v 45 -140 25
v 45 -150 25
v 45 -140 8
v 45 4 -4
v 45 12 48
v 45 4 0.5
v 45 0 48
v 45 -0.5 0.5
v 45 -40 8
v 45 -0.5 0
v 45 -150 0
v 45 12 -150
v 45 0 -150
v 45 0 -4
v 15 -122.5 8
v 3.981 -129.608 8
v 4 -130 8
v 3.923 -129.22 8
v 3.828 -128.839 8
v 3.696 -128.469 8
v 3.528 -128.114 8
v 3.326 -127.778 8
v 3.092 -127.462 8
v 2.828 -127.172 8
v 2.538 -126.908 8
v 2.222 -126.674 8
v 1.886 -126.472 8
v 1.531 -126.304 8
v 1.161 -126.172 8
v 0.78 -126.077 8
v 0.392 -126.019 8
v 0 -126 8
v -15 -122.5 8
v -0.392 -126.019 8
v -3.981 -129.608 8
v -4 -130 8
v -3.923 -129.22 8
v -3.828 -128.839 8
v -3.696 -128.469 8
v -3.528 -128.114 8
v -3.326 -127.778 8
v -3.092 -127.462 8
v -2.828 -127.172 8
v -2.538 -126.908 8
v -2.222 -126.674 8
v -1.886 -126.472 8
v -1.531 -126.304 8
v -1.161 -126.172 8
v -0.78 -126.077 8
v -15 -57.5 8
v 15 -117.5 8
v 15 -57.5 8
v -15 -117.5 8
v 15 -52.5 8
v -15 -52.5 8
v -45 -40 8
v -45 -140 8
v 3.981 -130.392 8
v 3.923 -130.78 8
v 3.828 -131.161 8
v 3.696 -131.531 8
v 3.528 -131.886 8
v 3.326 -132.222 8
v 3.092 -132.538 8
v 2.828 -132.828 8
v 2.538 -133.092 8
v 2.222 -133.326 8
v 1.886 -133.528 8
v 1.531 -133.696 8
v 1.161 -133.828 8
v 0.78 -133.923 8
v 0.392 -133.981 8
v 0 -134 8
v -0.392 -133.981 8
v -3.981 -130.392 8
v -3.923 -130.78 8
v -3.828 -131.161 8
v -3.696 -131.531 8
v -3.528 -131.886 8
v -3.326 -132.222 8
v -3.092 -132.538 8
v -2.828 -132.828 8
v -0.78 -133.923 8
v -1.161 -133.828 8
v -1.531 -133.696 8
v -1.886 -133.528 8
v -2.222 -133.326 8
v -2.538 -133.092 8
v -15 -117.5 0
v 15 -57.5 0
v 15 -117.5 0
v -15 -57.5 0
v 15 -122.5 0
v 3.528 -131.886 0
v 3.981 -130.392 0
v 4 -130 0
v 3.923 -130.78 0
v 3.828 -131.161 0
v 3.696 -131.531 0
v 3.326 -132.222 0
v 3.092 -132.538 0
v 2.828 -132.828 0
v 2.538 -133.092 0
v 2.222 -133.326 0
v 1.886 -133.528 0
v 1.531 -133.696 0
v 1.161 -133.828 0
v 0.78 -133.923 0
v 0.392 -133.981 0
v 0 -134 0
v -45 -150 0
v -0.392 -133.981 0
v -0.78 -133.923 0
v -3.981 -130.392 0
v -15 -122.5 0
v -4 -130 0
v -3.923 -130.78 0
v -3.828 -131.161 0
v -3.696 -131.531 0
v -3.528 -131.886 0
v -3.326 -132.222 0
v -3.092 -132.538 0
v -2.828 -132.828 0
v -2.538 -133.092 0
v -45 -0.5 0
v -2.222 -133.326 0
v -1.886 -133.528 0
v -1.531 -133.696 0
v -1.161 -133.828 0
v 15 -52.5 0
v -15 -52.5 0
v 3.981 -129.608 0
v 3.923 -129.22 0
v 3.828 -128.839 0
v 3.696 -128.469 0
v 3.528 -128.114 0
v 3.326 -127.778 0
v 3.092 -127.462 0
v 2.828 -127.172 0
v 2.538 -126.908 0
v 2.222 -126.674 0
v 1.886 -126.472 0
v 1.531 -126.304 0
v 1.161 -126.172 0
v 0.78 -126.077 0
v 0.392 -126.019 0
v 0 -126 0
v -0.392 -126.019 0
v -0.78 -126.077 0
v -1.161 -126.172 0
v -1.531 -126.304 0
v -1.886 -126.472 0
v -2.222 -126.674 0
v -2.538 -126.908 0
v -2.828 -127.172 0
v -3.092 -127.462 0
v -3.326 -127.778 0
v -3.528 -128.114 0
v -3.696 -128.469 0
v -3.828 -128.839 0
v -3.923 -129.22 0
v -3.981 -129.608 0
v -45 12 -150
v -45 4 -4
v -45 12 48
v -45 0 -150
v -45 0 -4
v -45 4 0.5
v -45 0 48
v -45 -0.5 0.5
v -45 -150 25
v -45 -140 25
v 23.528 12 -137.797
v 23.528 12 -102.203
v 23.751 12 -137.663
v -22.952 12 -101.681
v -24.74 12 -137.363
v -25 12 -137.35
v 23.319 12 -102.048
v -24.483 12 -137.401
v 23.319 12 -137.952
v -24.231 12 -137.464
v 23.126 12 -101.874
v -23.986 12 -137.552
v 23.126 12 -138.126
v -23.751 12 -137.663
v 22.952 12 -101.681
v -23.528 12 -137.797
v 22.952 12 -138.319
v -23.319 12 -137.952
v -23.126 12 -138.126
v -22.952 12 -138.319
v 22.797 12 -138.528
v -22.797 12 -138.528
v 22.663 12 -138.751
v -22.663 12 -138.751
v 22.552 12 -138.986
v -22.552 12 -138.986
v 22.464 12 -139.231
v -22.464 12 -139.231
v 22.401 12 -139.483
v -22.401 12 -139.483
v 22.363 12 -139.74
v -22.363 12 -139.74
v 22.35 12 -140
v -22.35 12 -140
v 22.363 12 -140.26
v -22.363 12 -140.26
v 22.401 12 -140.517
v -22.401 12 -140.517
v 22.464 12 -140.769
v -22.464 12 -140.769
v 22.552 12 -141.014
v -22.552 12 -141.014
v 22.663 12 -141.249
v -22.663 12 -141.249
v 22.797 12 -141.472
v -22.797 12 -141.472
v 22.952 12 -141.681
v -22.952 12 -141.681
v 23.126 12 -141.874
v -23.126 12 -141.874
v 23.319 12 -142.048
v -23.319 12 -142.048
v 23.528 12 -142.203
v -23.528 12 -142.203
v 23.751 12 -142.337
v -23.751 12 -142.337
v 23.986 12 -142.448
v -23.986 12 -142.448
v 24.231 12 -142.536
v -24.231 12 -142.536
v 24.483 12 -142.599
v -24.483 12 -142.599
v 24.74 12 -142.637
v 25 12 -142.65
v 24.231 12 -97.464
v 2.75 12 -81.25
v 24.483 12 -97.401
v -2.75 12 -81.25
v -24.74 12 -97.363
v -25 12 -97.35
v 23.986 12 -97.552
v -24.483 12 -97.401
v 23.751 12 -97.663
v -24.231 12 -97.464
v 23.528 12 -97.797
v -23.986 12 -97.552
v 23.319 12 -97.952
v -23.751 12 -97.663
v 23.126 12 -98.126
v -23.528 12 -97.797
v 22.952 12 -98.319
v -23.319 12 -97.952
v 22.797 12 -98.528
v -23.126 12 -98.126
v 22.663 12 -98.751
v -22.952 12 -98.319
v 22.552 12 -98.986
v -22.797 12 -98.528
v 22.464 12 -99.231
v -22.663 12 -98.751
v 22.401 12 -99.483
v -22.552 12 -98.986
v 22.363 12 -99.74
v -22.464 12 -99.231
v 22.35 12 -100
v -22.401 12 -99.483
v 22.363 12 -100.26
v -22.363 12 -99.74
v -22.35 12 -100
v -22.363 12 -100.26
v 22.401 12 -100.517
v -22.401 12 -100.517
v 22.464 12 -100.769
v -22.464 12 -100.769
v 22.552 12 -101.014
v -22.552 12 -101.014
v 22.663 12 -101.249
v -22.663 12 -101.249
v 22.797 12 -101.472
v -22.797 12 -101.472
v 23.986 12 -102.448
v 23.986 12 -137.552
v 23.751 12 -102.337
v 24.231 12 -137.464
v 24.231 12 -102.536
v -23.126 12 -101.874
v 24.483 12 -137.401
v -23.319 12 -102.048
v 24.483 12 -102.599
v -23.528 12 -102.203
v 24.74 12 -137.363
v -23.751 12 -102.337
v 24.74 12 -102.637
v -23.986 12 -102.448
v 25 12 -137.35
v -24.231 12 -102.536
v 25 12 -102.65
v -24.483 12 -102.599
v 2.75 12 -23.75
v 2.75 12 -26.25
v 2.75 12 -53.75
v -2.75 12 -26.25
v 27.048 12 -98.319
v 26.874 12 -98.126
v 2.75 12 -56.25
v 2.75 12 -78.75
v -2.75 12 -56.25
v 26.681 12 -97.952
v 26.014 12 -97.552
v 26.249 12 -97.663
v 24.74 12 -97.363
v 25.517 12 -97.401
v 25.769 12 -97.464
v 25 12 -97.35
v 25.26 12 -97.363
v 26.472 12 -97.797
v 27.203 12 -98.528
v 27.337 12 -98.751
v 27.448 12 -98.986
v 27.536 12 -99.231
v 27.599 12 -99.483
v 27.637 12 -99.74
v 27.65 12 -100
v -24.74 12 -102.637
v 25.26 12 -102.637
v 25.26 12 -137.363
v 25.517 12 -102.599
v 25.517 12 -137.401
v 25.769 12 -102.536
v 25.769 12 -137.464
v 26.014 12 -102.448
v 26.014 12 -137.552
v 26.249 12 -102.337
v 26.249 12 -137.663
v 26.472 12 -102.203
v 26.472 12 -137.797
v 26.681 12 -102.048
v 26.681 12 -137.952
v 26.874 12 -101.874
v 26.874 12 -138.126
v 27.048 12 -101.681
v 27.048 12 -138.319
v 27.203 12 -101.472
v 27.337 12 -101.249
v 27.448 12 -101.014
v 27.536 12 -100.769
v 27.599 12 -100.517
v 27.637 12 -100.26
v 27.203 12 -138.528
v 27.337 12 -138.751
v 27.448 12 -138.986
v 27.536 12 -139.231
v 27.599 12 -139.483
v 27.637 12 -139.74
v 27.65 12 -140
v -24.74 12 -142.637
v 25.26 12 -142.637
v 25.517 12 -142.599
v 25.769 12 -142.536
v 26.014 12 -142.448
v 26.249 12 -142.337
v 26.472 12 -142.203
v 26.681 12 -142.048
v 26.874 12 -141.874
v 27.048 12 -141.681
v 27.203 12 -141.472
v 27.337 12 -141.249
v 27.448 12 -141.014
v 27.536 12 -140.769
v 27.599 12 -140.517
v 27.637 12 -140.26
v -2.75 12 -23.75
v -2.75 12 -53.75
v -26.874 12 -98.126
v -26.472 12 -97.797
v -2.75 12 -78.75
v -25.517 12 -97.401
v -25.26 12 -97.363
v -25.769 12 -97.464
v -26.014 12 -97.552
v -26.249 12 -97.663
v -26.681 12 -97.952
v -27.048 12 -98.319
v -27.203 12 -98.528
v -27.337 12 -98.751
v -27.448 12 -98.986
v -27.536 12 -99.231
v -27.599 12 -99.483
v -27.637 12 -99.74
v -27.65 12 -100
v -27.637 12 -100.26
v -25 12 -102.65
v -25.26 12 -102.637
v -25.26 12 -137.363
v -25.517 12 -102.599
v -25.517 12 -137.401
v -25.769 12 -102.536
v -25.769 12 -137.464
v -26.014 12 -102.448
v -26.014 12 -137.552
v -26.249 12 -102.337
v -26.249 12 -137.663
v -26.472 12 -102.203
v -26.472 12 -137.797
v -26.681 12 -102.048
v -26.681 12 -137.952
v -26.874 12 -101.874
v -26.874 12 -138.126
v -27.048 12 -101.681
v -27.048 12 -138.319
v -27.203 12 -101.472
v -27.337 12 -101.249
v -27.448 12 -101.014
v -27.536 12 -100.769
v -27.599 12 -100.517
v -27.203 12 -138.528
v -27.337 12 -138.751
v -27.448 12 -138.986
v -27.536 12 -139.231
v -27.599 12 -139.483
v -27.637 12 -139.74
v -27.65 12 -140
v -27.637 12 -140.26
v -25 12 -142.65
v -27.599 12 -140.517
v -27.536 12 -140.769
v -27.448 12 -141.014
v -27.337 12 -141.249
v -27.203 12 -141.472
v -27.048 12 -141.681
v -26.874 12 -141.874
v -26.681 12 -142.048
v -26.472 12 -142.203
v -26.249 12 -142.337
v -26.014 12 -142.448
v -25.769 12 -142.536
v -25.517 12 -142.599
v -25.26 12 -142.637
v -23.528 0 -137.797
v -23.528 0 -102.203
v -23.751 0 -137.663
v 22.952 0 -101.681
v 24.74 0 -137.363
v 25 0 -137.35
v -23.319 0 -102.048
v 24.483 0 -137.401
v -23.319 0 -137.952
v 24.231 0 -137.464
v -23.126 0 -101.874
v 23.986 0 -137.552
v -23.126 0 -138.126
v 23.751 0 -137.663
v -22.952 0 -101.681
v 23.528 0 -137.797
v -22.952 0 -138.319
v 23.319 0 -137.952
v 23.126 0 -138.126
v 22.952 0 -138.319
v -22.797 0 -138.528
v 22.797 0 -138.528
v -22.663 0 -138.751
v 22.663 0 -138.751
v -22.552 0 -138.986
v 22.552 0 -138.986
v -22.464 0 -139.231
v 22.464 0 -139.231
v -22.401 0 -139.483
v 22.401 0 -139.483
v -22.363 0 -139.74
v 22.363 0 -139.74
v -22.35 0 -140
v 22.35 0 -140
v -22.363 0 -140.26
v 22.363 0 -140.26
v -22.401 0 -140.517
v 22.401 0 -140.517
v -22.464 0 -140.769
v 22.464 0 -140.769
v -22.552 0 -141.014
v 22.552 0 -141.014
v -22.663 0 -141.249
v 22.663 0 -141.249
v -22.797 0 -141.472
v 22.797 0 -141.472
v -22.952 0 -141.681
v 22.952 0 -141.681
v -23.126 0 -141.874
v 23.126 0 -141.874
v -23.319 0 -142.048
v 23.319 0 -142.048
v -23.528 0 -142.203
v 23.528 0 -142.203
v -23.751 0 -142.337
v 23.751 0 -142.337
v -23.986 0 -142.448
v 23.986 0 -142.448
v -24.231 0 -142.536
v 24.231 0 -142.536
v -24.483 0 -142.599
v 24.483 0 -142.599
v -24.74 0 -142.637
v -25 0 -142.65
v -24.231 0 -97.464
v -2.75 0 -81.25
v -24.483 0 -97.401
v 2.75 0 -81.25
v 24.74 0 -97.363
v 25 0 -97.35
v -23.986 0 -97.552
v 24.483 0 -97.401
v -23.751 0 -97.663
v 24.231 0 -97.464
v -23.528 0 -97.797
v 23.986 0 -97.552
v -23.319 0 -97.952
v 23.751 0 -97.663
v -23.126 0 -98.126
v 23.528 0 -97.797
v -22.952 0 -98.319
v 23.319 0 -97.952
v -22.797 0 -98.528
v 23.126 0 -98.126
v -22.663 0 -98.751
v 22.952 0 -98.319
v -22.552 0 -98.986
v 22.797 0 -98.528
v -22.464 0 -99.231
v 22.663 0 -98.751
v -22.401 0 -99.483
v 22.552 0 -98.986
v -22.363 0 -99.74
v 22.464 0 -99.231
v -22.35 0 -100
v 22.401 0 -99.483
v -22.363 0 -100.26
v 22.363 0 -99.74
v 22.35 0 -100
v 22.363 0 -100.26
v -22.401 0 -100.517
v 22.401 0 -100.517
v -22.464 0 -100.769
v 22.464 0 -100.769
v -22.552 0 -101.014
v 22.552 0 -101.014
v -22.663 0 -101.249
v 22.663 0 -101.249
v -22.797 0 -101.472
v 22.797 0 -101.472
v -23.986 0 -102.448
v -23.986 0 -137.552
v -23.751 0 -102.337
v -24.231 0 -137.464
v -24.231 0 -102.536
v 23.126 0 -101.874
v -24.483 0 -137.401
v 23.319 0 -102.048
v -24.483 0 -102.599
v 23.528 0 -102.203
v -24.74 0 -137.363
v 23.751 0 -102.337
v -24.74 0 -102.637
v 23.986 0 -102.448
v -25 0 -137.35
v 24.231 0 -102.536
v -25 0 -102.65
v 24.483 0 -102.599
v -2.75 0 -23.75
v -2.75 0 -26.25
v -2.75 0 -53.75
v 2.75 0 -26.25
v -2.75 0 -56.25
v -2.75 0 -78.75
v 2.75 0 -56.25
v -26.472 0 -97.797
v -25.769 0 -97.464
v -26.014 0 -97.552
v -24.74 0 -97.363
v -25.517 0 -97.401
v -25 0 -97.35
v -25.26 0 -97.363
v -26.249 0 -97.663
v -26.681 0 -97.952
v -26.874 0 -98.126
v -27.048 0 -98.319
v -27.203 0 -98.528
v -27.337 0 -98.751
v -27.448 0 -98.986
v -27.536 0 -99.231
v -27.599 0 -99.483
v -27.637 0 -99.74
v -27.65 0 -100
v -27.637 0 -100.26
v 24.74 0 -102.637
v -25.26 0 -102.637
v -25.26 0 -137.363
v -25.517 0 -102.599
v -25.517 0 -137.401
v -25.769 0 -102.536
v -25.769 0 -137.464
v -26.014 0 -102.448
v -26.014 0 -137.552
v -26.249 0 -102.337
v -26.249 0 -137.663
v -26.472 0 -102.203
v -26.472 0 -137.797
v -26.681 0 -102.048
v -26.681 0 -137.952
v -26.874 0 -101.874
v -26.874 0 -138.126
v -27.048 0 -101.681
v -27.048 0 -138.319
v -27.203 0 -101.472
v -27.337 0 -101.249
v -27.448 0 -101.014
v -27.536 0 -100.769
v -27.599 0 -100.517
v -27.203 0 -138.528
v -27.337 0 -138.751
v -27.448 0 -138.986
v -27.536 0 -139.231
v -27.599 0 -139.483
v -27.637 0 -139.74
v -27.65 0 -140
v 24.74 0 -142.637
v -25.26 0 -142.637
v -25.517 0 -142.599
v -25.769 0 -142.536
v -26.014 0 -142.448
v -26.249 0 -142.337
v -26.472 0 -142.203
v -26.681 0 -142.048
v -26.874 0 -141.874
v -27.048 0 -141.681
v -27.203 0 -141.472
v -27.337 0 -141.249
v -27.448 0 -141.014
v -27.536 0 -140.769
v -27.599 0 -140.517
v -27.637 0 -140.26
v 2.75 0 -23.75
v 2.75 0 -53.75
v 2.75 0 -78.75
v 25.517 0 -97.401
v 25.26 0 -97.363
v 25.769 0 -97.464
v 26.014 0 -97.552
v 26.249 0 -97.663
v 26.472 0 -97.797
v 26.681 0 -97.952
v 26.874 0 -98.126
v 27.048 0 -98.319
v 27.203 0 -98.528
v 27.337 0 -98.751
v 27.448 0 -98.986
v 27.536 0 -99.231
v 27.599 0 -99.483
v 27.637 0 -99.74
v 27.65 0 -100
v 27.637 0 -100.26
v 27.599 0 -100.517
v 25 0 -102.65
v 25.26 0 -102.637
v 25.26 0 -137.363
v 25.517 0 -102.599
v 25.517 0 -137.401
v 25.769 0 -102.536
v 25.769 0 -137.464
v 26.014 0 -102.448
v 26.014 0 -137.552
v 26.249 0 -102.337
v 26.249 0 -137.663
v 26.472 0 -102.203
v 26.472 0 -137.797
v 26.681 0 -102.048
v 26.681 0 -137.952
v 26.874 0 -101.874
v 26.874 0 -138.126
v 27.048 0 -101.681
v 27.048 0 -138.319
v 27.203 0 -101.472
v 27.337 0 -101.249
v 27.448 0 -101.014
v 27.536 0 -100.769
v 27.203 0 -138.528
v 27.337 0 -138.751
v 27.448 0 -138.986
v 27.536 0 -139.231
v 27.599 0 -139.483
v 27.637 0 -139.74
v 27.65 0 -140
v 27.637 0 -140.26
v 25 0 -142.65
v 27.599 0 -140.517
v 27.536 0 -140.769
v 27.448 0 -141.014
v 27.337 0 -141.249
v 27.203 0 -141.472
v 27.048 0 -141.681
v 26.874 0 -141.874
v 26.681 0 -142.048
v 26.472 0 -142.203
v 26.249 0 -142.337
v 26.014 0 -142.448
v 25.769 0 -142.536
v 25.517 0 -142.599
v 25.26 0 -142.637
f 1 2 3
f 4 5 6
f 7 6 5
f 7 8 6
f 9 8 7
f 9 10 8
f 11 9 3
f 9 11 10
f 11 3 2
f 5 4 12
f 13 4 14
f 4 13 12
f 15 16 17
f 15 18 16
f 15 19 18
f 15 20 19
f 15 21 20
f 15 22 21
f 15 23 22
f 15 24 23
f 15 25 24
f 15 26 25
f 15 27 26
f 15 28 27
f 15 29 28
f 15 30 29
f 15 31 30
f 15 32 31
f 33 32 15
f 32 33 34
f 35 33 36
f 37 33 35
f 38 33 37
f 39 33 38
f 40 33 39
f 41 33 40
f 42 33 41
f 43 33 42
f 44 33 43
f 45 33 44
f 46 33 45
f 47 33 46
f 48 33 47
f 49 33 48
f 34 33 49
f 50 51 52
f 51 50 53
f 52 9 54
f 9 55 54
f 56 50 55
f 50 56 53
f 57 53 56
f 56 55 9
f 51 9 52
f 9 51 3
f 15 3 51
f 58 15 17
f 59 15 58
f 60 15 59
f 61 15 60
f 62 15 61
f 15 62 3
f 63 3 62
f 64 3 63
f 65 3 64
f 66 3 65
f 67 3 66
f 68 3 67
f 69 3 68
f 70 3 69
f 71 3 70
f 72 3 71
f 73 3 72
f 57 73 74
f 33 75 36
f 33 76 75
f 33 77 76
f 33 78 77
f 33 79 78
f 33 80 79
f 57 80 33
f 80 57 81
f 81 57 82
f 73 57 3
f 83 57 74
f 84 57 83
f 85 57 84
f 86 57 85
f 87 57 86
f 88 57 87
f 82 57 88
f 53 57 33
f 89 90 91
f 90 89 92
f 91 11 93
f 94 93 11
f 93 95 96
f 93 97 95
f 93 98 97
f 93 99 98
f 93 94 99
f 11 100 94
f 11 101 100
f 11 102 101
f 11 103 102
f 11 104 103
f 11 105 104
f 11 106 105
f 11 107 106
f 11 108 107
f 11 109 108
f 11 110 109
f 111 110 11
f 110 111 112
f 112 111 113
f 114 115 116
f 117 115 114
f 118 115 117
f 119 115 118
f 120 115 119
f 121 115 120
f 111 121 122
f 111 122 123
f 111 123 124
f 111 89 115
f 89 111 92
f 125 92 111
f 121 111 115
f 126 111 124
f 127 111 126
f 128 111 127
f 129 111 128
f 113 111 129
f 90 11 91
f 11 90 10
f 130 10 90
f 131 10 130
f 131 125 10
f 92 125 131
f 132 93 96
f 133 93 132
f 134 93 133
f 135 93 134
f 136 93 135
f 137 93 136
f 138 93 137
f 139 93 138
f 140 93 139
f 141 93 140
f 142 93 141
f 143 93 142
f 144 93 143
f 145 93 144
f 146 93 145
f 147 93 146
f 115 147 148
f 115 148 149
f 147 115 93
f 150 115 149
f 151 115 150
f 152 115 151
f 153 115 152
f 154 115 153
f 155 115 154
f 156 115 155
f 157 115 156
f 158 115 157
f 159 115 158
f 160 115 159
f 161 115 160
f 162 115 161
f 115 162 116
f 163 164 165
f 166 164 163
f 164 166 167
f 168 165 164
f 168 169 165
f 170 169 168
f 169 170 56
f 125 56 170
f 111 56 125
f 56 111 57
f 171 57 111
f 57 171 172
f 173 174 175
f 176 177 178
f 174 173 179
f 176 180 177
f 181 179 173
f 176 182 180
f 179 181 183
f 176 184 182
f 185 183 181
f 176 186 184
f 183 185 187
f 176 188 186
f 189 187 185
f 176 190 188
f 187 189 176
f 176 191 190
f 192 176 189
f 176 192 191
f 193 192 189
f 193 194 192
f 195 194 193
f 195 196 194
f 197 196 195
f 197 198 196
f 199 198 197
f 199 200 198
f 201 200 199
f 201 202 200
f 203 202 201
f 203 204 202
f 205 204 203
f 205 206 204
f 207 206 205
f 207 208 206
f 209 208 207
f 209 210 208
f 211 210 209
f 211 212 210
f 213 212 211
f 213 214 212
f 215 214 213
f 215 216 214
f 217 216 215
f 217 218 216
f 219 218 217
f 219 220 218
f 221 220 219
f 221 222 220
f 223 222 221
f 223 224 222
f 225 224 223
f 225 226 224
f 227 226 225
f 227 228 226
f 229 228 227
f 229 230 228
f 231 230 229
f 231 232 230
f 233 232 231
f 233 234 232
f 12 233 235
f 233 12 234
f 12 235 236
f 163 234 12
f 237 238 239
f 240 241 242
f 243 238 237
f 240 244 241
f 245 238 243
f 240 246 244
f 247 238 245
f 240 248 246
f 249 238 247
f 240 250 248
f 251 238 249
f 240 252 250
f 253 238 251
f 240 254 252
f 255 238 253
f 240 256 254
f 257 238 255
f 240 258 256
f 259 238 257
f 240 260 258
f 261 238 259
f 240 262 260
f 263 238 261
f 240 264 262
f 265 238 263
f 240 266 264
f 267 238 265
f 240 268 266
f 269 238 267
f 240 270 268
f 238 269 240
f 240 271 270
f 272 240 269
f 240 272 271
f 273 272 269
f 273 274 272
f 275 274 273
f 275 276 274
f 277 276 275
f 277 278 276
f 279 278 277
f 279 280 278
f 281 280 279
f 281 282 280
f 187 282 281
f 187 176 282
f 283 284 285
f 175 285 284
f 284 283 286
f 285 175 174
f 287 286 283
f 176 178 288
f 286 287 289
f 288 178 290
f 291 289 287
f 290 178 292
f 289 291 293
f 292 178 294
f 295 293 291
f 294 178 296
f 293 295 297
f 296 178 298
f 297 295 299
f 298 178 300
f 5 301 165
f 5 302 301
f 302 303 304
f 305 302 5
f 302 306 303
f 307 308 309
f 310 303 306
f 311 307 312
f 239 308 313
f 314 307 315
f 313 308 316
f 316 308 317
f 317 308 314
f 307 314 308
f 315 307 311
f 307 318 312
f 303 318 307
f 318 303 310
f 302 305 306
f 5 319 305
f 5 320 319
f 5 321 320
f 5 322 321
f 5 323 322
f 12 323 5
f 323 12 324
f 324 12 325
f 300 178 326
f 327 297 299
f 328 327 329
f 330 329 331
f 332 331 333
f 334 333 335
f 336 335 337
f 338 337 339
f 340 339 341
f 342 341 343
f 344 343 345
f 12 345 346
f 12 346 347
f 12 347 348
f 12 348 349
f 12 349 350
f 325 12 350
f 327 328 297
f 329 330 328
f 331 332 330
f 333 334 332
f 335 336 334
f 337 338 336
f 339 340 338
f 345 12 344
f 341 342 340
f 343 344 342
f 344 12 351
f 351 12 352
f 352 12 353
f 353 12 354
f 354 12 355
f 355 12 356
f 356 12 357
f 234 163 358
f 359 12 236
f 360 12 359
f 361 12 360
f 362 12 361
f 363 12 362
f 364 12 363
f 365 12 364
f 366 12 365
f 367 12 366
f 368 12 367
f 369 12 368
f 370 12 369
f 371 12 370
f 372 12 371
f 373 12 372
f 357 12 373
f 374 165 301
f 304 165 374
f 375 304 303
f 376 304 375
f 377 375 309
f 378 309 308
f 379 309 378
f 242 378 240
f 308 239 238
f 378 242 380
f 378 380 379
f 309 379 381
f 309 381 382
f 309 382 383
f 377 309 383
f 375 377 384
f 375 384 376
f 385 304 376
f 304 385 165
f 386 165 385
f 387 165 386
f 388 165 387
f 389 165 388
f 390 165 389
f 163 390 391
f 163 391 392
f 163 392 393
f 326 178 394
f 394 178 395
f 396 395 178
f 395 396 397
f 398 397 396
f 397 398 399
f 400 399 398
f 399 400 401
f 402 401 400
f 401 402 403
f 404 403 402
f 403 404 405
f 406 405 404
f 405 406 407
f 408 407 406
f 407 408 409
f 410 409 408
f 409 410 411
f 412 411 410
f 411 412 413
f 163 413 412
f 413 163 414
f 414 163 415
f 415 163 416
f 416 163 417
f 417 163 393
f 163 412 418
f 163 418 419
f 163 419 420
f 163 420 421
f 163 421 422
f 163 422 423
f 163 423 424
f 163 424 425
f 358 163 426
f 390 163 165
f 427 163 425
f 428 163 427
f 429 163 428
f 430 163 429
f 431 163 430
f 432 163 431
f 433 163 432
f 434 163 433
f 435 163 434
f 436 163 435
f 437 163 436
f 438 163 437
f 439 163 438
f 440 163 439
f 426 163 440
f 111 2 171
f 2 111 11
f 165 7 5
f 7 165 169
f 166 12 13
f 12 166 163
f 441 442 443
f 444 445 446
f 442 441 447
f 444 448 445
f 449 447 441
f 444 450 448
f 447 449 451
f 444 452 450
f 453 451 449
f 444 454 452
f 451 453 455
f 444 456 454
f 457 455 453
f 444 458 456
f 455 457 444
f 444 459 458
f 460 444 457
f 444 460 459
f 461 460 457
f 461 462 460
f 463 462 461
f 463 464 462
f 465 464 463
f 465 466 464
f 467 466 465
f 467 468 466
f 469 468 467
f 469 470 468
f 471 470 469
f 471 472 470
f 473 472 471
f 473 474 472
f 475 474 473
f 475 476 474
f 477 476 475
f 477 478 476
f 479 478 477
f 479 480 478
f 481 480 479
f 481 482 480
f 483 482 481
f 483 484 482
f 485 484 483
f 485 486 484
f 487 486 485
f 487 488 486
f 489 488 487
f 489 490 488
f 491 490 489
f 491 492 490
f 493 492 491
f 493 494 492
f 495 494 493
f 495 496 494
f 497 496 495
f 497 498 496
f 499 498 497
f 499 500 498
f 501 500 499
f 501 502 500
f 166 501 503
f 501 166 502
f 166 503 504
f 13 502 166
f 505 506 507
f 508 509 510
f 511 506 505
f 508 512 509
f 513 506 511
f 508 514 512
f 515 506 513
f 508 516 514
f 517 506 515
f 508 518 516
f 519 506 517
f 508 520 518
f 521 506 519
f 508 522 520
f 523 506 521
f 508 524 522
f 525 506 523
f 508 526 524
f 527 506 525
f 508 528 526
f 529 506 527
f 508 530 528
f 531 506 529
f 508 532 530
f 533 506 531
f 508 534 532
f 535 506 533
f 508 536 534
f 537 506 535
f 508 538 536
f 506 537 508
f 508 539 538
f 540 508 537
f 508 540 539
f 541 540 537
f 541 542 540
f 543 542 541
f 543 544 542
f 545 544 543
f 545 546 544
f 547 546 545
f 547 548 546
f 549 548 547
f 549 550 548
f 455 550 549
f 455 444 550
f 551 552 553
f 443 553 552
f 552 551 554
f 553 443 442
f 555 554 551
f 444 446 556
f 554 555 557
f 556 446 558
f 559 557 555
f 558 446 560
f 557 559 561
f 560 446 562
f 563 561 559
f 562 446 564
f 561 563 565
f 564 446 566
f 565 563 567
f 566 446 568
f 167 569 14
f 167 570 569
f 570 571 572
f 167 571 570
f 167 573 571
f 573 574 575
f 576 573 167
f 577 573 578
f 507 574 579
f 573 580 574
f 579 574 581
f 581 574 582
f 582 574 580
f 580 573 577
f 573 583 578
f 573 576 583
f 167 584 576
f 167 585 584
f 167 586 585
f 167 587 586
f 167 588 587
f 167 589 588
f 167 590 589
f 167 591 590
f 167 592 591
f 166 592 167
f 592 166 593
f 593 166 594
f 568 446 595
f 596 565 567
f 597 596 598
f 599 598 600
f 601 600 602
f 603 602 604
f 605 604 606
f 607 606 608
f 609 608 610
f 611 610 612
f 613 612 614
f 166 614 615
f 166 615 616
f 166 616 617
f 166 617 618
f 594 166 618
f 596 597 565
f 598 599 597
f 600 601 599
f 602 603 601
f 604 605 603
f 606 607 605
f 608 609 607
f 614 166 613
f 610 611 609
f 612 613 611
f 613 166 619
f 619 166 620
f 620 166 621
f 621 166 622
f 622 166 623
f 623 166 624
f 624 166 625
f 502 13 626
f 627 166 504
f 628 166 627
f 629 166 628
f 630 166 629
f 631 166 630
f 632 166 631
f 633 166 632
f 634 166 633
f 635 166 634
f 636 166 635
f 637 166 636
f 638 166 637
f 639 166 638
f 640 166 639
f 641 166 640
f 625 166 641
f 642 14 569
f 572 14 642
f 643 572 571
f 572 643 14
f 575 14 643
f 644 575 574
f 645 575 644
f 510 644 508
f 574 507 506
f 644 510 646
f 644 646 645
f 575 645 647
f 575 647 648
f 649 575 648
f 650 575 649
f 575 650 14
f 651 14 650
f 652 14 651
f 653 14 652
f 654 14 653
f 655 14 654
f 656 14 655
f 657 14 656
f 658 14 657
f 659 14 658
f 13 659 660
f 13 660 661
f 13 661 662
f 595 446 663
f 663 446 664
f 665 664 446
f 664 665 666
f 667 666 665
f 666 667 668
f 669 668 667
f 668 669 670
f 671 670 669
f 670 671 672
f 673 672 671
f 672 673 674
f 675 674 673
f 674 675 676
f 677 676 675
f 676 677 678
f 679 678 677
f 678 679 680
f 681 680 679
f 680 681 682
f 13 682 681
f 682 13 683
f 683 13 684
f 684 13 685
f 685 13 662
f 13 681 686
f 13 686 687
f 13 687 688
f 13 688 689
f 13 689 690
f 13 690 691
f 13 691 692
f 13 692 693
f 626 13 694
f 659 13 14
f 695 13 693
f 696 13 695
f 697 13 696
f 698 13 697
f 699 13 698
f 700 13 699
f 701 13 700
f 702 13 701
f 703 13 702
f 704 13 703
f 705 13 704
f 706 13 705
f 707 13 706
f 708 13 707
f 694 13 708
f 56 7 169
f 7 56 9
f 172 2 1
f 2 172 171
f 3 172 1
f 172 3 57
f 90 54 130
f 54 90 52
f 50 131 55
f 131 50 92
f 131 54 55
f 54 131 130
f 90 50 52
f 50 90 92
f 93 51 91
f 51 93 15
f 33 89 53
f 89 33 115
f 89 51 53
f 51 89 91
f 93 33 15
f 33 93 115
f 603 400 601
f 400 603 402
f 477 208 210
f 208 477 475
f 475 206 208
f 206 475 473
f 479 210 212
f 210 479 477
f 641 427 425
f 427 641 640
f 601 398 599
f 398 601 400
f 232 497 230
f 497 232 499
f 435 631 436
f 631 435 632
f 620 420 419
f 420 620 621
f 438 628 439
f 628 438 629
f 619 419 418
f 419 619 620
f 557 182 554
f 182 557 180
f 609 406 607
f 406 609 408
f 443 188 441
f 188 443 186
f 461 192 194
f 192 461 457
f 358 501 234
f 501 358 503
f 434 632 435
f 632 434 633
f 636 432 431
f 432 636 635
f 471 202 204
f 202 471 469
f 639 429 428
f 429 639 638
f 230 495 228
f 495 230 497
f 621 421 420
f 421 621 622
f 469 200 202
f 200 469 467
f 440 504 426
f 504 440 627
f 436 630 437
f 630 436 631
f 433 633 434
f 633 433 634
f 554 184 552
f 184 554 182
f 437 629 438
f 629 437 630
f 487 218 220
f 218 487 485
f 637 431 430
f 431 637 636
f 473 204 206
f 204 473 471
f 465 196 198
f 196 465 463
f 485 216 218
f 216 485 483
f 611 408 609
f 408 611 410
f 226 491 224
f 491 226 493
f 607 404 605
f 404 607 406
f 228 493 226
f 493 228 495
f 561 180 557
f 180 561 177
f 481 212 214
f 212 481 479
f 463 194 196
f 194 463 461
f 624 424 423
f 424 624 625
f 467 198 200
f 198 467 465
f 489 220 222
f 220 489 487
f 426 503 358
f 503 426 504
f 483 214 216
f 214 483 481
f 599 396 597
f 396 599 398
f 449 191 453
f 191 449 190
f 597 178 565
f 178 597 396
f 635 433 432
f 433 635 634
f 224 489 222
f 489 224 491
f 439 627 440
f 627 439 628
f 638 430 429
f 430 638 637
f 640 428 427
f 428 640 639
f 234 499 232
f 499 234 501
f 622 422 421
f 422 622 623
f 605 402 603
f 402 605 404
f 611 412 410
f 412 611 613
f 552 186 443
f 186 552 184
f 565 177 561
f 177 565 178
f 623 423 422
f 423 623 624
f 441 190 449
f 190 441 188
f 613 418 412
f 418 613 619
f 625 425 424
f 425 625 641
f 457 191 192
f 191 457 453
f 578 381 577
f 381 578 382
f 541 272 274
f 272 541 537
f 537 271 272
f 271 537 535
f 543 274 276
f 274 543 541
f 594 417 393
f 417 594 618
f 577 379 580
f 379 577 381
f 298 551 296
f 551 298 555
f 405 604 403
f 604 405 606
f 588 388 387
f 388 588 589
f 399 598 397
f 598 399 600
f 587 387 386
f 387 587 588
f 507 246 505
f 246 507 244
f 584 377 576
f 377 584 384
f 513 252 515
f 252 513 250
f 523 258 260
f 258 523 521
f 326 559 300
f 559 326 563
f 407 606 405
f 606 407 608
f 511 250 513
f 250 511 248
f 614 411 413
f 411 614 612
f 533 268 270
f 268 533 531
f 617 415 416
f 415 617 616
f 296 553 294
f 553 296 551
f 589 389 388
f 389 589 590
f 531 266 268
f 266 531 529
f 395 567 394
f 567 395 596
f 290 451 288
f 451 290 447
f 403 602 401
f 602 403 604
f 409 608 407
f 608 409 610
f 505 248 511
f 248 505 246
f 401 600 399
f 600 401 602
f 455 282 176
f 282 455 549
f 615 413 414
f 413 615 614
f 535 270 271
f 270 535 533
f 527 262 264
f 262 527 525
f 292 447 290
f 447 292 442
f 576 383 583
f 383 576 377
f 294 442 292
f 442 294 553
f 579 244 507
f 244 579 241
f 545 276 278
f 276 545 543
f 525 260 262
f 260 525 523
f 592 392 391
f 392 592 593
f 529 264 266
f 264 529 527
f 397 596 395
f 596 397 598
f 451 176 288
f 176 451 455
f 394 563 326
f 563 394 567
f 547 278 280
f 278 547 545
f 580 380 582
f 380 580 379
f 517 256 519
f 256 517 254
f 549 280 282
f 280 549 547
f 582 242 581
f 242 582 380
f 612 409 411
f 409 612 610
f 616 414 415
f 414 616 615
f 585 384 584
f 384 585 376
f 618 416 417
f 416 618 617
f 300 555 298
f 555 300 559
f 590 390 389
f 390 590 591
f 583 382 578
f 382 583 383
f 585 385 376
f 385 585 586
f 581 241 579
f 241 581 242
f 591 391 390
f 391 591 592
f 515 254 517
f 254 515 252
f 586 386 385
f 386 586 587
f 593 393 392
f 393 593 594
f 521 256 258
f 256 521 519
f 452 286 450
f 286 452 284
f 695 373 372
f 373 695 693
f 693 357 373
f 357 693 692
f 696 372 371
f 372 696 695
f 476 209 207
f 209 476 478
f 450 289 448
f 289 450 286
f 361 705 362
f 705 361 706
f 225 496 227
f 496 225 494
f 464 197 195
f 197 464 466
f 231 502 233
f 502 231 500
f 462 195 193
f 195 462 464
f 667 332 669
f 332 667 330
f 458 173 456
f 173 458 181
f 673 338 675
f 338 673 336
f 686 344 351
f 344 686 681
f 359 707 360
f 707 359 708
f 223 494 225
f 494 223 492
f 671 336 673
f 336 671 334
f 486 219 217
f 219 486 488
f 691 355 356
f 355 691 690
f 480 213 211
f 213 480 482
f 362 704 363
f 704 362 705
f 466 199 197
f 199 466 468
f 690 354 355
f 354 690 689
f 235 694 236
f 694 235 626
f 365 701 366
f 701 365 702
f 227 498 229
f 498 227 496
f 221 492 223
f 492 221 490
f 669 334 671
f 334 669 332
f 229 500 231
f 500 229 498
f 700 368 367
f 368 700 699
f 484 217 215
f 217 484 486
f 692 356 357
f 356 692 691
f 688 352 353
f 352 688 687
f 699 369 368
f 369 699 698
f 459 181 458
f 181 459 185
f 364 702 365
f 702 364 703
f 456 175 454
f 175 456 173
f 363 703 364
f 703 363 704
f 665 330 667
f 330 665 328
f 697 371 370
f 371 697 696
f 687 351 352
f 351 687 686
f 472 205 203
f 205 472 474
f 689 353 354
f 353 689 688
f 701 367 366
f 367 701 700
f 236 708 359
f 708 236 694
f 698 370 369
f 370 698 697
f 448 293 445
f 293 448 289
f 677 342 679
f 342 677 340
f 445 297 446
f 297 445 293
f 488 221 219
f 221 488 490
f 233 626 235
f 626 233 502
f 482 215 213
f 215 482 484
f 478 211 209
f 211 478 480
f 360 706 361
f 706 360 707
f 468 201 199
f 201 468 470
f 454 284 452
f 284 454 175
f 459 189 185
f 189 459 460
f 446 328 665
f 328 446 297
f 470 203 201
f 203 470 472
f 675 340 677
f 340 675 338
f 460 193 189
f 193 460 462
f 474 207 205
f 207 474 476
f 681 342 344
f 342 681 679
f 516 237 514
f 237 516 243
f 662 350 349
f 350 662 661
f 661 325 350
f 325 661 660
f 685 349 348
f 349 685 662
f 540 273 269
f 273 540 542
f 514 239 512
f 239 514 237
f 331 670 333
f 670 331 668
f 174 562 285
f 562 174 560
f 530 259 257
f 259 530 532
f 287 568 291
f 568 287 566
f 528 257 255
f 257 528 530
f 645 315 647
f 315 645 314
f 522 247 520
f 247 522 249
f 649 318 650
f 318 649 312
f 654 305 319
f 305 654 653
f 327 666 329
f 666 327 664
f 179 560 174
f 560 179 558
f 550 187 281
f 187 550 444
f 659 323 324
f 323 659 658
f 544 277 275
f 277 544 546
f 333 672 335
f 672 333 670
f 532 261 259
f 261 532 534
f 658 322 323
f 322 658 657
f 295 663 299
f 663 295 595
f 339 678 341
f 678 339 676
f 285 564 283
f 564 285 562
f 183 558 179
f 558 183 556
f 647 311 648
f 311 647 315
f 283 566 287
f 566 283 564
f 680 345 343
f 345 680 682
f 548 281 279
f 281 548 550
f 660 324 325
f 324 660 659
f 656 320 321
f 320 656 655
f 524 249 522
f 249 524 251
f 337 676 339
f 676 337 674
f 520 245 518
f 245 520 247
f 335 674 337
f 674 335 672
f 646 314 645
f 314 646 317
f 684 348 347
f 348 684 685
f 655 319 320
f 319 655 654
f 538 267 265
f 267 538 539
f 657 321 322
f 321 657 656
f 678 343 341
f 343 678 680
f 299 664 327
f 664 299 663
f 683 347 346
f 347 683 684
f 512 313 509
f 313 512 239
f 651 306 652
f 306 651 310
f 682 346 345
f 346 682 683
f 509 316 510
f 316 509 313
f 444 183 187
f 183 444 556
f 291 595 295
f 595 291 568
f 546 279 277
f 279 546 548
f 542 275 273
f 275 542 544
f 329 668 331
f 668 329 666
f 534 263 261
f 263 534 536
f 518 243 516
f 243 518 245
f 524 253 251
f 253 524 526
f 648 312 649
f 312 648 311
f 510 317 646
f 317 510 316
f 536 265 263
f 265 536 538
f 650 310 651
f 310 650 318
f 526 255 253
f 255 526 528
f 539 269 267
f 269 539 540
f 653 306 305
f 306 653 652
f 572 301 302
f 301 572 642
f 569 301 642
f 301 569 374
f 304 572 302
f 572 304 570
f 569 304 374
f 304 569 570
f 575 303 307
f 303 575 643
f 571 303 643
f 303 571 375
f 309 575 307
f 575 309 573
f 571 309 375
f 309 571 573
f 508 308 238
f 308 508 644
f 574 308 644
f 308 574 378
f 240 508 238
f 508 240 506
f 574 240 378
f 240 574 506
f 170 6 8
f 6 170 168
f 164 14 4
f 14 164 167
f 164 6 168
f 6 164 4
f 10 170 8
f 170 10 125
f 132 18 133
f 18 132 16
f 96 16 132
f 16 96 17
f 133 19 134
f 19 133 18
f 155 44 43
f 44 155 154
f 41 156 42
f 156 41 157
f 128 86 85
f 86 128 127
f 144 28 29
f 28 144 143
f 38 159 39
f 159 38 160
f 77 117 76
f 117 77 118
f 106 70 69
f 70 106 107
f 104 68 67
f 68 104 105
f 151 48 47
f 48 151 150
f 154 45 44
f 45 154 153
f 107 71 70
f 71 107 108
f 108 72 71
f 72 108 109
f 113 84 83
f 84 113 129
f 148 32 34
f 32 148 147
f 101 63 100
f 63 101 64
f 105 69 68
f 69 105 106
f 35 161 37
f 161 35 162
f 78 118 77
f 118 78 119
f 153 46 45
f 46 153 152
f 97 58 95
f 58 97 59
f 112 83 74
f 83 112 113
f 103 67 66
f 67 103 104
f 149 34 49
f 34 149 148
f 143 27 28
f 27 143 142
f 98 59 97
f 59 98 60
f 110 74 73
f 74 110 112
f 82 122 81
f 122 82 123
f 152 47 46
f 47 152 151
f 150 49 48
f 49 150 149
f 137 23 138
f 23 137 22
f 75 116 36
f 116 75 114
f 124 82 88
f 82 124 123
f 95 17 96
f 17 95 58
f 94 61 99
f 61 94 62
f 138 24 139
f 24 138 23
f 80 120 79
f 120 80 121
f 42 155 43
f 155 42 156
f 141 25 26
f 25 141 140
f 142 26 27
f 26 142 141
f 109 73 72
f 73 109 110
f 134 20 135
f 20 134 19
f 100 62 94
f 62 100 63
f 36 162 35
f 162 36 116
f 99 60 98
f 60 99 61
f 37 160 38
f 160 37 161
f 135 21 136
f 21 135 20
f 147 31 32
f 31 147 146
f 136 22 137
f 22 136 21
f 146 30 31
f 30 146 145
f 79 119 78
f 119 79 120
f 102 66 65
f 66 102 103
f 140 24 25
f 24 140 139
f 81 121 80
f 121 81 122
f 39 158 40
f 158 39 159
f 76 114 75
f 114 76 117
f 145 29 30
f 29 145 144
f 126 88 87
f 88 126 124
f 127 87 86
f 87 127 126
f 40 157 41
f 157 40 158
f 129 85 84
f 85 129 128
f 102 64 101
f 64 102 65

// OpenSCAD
// =====================================================================
// xdcr_poolside_jig.scad — TD04A プールサイド L 字治具 (実験用)
// プールの縁にまたがせ、デッキ側の水平板におもりを載せて押さえる。
// 支柱がプール内壁に沿って下り、下端の水平棚に xdcr_clamp を M5×4 で
// 載せる。棚には 0°/90° の 2 組のボルトパターンがあり、音響ビームを
// 壁に対して垂直 (対面測距) にも平行 (同一壁面上での測距) にも向けられる。
//
//   part="hook" : デッキ板 + 縁の立ち上がり/ガセット + 支柱 (上半分)
//   part="foot" : 立ち下がり (下半分) + 振動子棚
//   2 つを重ね継ぎ (foot が hook の池側面に重なる) して M5×4 で締結する。
//   2 分割なのは、必要な水深 (デッキ面下 ~290mm) が印刷ベッドに載らないため。
//
// 座標系: X = 幅(0 が中心) / Y = プール方向(+Y が水側、Y=0 が壁面) /
//         Z = 0 がデッキ面、下が -Z。
// 印刷向き: hook / foot とも「幅 X を Z 方向に立てて」印刷する。
//   断面 (YZ の L 形) がそのままベッドに載り、全層が同じ断面になるので
//   サポートは一切要らず、曲げ荷重も層内で受けられる。
//   → スライサで X 軸まわりに 90° 回してから配置すること。
// 要実測: lip_y(縁のせり出し) / freeboard(デッキ面→水面) / TD04A 実寸
// =====================================================================

/* [部品選択] */
part      = "hook";   // [hook, foot]

/* [プール縁 (要実測)] */
lip_y     = 0;        // 縁のせり出し量。壁面 Y=0 に対し支柱をこれだけ外に出す
                      // (オーバーフロー溝の庇/グレーチングがある場合はその幅)
freeboard = 100;      // デッキ面 → 水面 (深さの計算・表示にのみ使う)
corner_rl = 4;        // 縁の丸み逃げ (支柱の壁側かどをこれだけ欠く)

/* [共通] */
width     = 90;       // 幅 (X) ※印刷時はこれが Z 高さになる
plate_t   = 12;       // 構造板厚 (支柱 / 立ち下がり / 棚)
deck_t    = 8;        // デッキ板厚 (下は地面なので薄くてよい)
m5_d      = 5.3;      // M5 クリアランス穴
m5_wash   = 10;       // M5 平座金の外径 (干渉チェック用)

/* [hook: デッキ側] */
deck_len  = 150;      // デッキ板の長さ (Y、縁から陸側へ)
gus_run   = 40;       // ガセットがデッキ板を這う長さ
gus_rise  = 40;       // 縁の立ち上がり高さ (おもりのプール側ストッパ兼用)
rib_t     = 10;       // 陸側端リブの厚み (おもりの陸側ストッパ)
rib_h     = 25;       // 同 高さ
hook_drop = 150;      // デッキ面 → 支柱下端
strap_y   = [-55, -120];  // おもり固定ストラップのスロット中心 Y
strap_w   = 30;       // スロット長 (X)
strap_t   = 5;        // スロット幅 (Y)
lany_d    = 8;        // 安全ロープ穴
lany_y    = -130;

/* [継手 (hook ⇄ foot の重ね継ぎ)] */
lap_len   = 60;       // 重ね代
lap_x     = 25;       // 継手ボルトの X (±)
lap_edge  = 10;       // 重ね代の端 → 一番端のボルト中心
lap_dz    = 40;       // 継手ボルトの Z 間隔

/* [foot: 棚側] */
foot_rise = 200;      // foot の全高 (継手上端 → 棚下面)
foot_len  = 90;       // 棚の張り出し (Y)

/* [xdcr_clamp とのインタフェース ※向こうの値と一致させること] */
mount_x   = 40;       // xdcr_clamp の M5 ピッチ X
mount_y   = 68;       // 同 Y
clamp_bw  = 56;       // xdcr_clamp の base_w (X)
clamp_bd  = 84;       // 同 base_d (Y)
clamp_axz = 20.5;     // 同 取付面 → 振動子軸 (base_t + bore_d/2)
clamp_fx  = 38;       // 同 マウント中心 → 音響放射面 (grip_x0 + xdcr_len)
beam_deg  = 22;       // TD04A 指向角 (全角)

/* [xdcr_socket も載せられるようにする] */
sock_p    = 40;       // xdcr_socket の hole_p と一致 (40 角)

/* [ケーブル固定] */
tie_w     = 5.5;      // 結束バンド幅 (4.8mm 帯)
tie_t     = 2.5;      // 同 厚み
hook_tz   = [-25, -55, -80];    // hook 支柱のスロット Z
foot_tz   = [-180, -240];       // foot 立ち下がりのスロット Z

/* [印刷ベッド] */
bed_xy    = 220;      // ベッド一辺 (断面がこれに収まること)
bed_h     = 250;      // ビルド高さ (width がこれに収まること)

$fn = 64;

// ---- 導出寸法 ---------------------------------------------------------
arm_y0   = lip_y;                 // 支柱の壁側面
arm_y1   = arm_y0 + plate_t;      // 支柱の池側面 (= 継手面)
deck_y0  = arm_y0 - deck_len;     // デッキ板の陸側端
post_top = deck_t + gus_rise;     // 縁の立ち上がり天端

foot_y0  = arm_y1;                // foot 立ち下がりの壁側面 (継手で重なる)
foot_y1  = foot_y0 + plate_t;     // 同 池側面
foot_top = -hook_drop + lap_len;  // foot の上端 Z
shelf_tz = foot_top - foot_rise + plate_t;   // 棚の上面 Z (= xdcr_clamp 取付面)
shelf_y0 = foot_y1;
shelf_y1 = foot_y1 + foot_len;
shelf_cy = (shelf_y0 + shelf_y1)/2;          // 棚の中心 Y (= マウント中心)

lap_z    = [-hook_drop + lap_edge, -hook_drop + lap_edge + lap_dz];

axis_z   = shelf_tz + clamp_axz;             // 振動子軸 (デッキ面基準)
depth_dk = -axis_z;                          // デッキ面下の深さ
depth_wt = depth_dk - freeboard;             // 水面下の深さ
face_y   = shelf_cy + clamp_fx;              // 放射面の Y (0° 取付時)

// 断面 (印刷時にベッドへ載る面) の大きさ
hook_py  = arm_y1 - deck_y0;
hook_pz  = hook_drop + post_top;
foot_py  = plate_t + foot_len;
foot_pz  = foot_rise;

// 棚のボルト穴 (棚中心からの相対座標)
shelf_holes = concat(
    [for (sx=[-1,1], sy=[-1,1]) [sx*mount_x/2, sy*mount_y/2]],   // xdcr_clamp 0°
    [for (sx=[-1,1], sy=[-1,1]) [sx*mount_y/2, sy*mount_x/2]],   // xdcr_clamp 90°
    [for (sx=[-1,1], sy=[-1,1]) [sx*sock_p/2,  sy*sock_p/2]]);   // xdcr_socket

// ---- 干渉チェック -----------------------------------------------------
// 印刷ベッド
assert(hook_py <= bed_xy && hook_pz <= bed_xy,
       str("hook の断面 ", hook_py, " x ", hook_pz, " がベッド ", bed_xy, " 角に載らない"));
assert(foot_py <= bed_xy && foot_pz <= bed_xy,
       str("foot の断面 ", foot_py, " x ", foot_pz, " がベッド ", bed_xy, " 角に載らない"));
assert(width <= bed_h, "width がビルド高さを超える");

// 継手
assert(lap_len >= 4*plate_t, "重ね代が板厚の4倍未満。継手が効かない");
assert(hook_drop > lap_len + 40, "支柱が短く、重ね代でほぼ埋まってしまう");
assert(lap_edge >= m5_d/2 + 4, "継手ボルトの端距離不足");
assert(lap_edge + lap_dz + m5_d/2 + 4 <= lap_len, "継手ボルトが重ね代からはみ出す");
assert(lap_x + m5_wash/2 + 4 <= width/2, "継手ボルトの座金が幅からはみ出す");
// 支柱の結束スロットは中央、継手ボルトは端 → X で離れていること
assert(lap_x - m5_d/2 >= tie_w/2 + 3, "継手ボルトと結束スロットが接近");
for (tz = hook_tz)
    assert(tz > -hook_drop + lap_len + 2,
           str("hook の結束スロット z=", tz, " が継手の重ね代に隠れる"));
for (tz = foot_tz)
    assert(tz < foot_top - lap_len - 2 && tz > shelf_tz + 10,
           str("foot の結束スロット z=", tz, " が継手/棚に掛かる"));

// デッキ板まわり
assert(corner_rl < plate_t - 4, "縁の丸み逃げが深すぎて支柱が痩せる");
assert(corner_rl < deck_t, "縁の丸み逃げがデッキ板厚以上");
for (sy = strap_y) {
    assert(sy + strap_t/2 < arm_y0 - gus_run - 3,
           str("ストラップスロット y=", sy, " がガセットの下に潜って抜けない"));
    assert(sy - strap_t/2 > deck_y0 + rib_t + 3,
           str("ストラップスロット y=", sy, " が端リブに掛かる"));
}
assert(lany_y - lany_d/2 > deck_y0 + rib_t + 2, "安全ロープ穴が端リブに掛かる");
for (sy = strap_y)
    assert(abs(lany_y - sy) >= lany_d/2 + strap_t/2 + 2,
           "安全ロープ穴とストラップスロットが接近");
assert(deck_len - rib_t - gus_run >= 80, "おもりを置く平面が狭すぎる");
assert(strap_w + 2*4 <= width, "ストラップスロットの X 縁距離不足");

// 棚 (ボルト穴同士・縁距離・立ち下がりとの逃げ)
for (i = [0:len(shelf_holes)-2]) for (j = [i+1:len(shelf_holes)-1])
    assert(norm(shelf_holes[i] - shelf_holes[j]) >= m5_d + 3,
           str("棚のボルト穴が接近: ", shelf_holes[i], " と ", shelf_holes[j]));
for (h = shelf_holes) {
    assert(abs(h[0]) + m5_d/2 + 4 <= width/2,
           str("棚のボルト穴 ", h, " の X 縁距離不足"));
    assert(abs(h[1]) + m5_d/2 + 4 <= foot_len/2,
           str("棚のボルト穴 ", h, " の Y 縁距離不足 (foot_len を増やす)"));
    // 座金が立ち下がりの根元に乗り上げないこと
    assert(foot_len/2 + h[1] - m5_wash/2 >= 2,
           str("棚のボルト穴 ", h, " の座金が立ち下がりに干渉"));
}
// xdcr_clamp のベースが棚に収まること (0° / 90° 両方)
assert(clamp_bw <= foot_len - 4 && clamp_bd + 4 <= width,
       str("xdcr_clamp のベース ", clamp_bw, "x", clamp_bd, " が棚に収まらない"));
assert(clamp_bd <= foot_len - 4 && clamp_bw + 4 <= width,
       "xdcr_clamp を 90° 回すと棚に収まらない");
// 音響ビーム (半角 beam_deg/2) が棚の前縁に当たらないこと
assert(clamp_axz > (foot_len/2 - clamp_fx) * tan(beam_deg/2),
       str("棚の前縁が音響ビームに掛かる: 軸高さ ", clamp_axz, " < ",
           (foot_len/2 - clamp_fx) * tan(beam_deg/2)));

echo(str("[xdcr_poolside_jig] 総ドロップ(デッキ面→棚下面) ", -shelf_tz + plate_t,
         " / 振動子軸 デッキ面下 ", depth_dk, " (水面下 ", depth_wt, ")",
         " / 壁面→放射面 ", face_y,
         " / 断面 hook ", hook_py, "x", hook_pz, " foot ", foot_py, "x", foot_pz));

// ---- モジュール -------------------------------------------------------
// YZ 平面の直角三角形 (0,0)-(-run,0)-(0,rise) を +X へ w 押し出す
module gusset_yz(run, rise, w) {
    rotate([90, 0, 90])
        linear_extrude(height = w)
            polygon([[0, 0], [-run, 0], [0, rise]]);
}

// 板を Y 方向に貫く結束バンドスロット (X 中央、高さ z)
module tie_slot(y0, z, th) {
    translate([-tie_w/2, y0 - 0.5, z - tie_t/2]) cube([tie_w, th + 1, tie_t]);
}

// 継手ボルト穴 ×4 (Y 方向に貫通)
module lap_bolts(y0, th) {
    for (sx = [-1, 1]) for (z = lap_z)
        translate([sx*lap_x, y0 - 0.5, z]) rotate([-90, 0, 0])
            cylinder(d=m5_d, h=th + 1);
}

// ---- hook (デッキ板 + 縁の立ち上がり + 支柱上半分) ---------------------
module hook() {
    difference() {
        union() {
            // デッキ板
            translate([-width/2, deck_y0, 0])
                cube([width, arm_y1 - deck_y0, deck_t]);
            // 支柱 (下端 → 縁の立ち上がり天端)
            translate([-width/2, arm_y0, -hook_drop])
                cube([width, plate_t, hook_drop + post_top]);
            // ガセット (立ち上がり ⇄ デッキ板)
            translate([-width/2, arm_y0, deck_t]) gusset_yz(gus_run, gus_rise, width);
            // 陸側端リブ (おもりのストッパ)
            translate([-width/2, deck_y0, 0]) cube([width, rib_t, rib_h]);
        }
        // 縁の丸み逃げ (支柱の壁側かど)
        translate([-width/2 - 0.5, arm_y0 - 0.5, -corner_rl])
            cube([width + 1, corner_rl + 0.5, corner_rl + 0.5]);
        // おもり固定ストラップのスロット
        for (sy = strap_y)
            translate([-strap_w/2, sy - strap_t/2, -0.5])
                cube([strap_w, strap_t, deck_t + 1]);
        // 安全ロープ穴 (治具ごと落とさないための命綱)
        translate([0, lany_y, -0.5]) cylinder(d=lany_d, h=deck_t + 1);
        // 継手ボルト
        lap_bolts(arm_y0, plate_t);
        // ケーブル結束スロット
        for (tz = hook_tz) tie_slot(arm_y0, tz, plate_t);
    }
}

// ---- foot (立ち下がり下半分 + 振動子棚) --------------------------------
module foot() {
    difference() {
        union() {
            // 立ち下がり (上端 lap_len 分が hook の池側面に重なる)
            translate([-width/2, foot_y0, shelf_tz - plate_t])
                cube([width, plate_t, foot_rise]);
            // 振動子棚
            translate([-width/2, shelf_y0, shelf_tz - plate_t])
                cube([width, foot_len, plate_t]);
        }
        // 継手ボルト
        lap_bolts(foot_y0, plate_t);
        // ケーブル結束スロット
        for (tz = foot_tz) tie_slot(foot_y0, tz, plate_t);
        // 取付穴 (xdcr_clamp 0°/90° + xdcr_socket)。水抜きも兼ねる
        for (h = shelf_holes)
            translate([h[0], shelf_cy + h[1], shelf_tz - plate_t - 0.5])
                cylinder(d=m5_d, h=plate_t + 1);
    }
}

if (part == "hook") hook();
else                foot();
